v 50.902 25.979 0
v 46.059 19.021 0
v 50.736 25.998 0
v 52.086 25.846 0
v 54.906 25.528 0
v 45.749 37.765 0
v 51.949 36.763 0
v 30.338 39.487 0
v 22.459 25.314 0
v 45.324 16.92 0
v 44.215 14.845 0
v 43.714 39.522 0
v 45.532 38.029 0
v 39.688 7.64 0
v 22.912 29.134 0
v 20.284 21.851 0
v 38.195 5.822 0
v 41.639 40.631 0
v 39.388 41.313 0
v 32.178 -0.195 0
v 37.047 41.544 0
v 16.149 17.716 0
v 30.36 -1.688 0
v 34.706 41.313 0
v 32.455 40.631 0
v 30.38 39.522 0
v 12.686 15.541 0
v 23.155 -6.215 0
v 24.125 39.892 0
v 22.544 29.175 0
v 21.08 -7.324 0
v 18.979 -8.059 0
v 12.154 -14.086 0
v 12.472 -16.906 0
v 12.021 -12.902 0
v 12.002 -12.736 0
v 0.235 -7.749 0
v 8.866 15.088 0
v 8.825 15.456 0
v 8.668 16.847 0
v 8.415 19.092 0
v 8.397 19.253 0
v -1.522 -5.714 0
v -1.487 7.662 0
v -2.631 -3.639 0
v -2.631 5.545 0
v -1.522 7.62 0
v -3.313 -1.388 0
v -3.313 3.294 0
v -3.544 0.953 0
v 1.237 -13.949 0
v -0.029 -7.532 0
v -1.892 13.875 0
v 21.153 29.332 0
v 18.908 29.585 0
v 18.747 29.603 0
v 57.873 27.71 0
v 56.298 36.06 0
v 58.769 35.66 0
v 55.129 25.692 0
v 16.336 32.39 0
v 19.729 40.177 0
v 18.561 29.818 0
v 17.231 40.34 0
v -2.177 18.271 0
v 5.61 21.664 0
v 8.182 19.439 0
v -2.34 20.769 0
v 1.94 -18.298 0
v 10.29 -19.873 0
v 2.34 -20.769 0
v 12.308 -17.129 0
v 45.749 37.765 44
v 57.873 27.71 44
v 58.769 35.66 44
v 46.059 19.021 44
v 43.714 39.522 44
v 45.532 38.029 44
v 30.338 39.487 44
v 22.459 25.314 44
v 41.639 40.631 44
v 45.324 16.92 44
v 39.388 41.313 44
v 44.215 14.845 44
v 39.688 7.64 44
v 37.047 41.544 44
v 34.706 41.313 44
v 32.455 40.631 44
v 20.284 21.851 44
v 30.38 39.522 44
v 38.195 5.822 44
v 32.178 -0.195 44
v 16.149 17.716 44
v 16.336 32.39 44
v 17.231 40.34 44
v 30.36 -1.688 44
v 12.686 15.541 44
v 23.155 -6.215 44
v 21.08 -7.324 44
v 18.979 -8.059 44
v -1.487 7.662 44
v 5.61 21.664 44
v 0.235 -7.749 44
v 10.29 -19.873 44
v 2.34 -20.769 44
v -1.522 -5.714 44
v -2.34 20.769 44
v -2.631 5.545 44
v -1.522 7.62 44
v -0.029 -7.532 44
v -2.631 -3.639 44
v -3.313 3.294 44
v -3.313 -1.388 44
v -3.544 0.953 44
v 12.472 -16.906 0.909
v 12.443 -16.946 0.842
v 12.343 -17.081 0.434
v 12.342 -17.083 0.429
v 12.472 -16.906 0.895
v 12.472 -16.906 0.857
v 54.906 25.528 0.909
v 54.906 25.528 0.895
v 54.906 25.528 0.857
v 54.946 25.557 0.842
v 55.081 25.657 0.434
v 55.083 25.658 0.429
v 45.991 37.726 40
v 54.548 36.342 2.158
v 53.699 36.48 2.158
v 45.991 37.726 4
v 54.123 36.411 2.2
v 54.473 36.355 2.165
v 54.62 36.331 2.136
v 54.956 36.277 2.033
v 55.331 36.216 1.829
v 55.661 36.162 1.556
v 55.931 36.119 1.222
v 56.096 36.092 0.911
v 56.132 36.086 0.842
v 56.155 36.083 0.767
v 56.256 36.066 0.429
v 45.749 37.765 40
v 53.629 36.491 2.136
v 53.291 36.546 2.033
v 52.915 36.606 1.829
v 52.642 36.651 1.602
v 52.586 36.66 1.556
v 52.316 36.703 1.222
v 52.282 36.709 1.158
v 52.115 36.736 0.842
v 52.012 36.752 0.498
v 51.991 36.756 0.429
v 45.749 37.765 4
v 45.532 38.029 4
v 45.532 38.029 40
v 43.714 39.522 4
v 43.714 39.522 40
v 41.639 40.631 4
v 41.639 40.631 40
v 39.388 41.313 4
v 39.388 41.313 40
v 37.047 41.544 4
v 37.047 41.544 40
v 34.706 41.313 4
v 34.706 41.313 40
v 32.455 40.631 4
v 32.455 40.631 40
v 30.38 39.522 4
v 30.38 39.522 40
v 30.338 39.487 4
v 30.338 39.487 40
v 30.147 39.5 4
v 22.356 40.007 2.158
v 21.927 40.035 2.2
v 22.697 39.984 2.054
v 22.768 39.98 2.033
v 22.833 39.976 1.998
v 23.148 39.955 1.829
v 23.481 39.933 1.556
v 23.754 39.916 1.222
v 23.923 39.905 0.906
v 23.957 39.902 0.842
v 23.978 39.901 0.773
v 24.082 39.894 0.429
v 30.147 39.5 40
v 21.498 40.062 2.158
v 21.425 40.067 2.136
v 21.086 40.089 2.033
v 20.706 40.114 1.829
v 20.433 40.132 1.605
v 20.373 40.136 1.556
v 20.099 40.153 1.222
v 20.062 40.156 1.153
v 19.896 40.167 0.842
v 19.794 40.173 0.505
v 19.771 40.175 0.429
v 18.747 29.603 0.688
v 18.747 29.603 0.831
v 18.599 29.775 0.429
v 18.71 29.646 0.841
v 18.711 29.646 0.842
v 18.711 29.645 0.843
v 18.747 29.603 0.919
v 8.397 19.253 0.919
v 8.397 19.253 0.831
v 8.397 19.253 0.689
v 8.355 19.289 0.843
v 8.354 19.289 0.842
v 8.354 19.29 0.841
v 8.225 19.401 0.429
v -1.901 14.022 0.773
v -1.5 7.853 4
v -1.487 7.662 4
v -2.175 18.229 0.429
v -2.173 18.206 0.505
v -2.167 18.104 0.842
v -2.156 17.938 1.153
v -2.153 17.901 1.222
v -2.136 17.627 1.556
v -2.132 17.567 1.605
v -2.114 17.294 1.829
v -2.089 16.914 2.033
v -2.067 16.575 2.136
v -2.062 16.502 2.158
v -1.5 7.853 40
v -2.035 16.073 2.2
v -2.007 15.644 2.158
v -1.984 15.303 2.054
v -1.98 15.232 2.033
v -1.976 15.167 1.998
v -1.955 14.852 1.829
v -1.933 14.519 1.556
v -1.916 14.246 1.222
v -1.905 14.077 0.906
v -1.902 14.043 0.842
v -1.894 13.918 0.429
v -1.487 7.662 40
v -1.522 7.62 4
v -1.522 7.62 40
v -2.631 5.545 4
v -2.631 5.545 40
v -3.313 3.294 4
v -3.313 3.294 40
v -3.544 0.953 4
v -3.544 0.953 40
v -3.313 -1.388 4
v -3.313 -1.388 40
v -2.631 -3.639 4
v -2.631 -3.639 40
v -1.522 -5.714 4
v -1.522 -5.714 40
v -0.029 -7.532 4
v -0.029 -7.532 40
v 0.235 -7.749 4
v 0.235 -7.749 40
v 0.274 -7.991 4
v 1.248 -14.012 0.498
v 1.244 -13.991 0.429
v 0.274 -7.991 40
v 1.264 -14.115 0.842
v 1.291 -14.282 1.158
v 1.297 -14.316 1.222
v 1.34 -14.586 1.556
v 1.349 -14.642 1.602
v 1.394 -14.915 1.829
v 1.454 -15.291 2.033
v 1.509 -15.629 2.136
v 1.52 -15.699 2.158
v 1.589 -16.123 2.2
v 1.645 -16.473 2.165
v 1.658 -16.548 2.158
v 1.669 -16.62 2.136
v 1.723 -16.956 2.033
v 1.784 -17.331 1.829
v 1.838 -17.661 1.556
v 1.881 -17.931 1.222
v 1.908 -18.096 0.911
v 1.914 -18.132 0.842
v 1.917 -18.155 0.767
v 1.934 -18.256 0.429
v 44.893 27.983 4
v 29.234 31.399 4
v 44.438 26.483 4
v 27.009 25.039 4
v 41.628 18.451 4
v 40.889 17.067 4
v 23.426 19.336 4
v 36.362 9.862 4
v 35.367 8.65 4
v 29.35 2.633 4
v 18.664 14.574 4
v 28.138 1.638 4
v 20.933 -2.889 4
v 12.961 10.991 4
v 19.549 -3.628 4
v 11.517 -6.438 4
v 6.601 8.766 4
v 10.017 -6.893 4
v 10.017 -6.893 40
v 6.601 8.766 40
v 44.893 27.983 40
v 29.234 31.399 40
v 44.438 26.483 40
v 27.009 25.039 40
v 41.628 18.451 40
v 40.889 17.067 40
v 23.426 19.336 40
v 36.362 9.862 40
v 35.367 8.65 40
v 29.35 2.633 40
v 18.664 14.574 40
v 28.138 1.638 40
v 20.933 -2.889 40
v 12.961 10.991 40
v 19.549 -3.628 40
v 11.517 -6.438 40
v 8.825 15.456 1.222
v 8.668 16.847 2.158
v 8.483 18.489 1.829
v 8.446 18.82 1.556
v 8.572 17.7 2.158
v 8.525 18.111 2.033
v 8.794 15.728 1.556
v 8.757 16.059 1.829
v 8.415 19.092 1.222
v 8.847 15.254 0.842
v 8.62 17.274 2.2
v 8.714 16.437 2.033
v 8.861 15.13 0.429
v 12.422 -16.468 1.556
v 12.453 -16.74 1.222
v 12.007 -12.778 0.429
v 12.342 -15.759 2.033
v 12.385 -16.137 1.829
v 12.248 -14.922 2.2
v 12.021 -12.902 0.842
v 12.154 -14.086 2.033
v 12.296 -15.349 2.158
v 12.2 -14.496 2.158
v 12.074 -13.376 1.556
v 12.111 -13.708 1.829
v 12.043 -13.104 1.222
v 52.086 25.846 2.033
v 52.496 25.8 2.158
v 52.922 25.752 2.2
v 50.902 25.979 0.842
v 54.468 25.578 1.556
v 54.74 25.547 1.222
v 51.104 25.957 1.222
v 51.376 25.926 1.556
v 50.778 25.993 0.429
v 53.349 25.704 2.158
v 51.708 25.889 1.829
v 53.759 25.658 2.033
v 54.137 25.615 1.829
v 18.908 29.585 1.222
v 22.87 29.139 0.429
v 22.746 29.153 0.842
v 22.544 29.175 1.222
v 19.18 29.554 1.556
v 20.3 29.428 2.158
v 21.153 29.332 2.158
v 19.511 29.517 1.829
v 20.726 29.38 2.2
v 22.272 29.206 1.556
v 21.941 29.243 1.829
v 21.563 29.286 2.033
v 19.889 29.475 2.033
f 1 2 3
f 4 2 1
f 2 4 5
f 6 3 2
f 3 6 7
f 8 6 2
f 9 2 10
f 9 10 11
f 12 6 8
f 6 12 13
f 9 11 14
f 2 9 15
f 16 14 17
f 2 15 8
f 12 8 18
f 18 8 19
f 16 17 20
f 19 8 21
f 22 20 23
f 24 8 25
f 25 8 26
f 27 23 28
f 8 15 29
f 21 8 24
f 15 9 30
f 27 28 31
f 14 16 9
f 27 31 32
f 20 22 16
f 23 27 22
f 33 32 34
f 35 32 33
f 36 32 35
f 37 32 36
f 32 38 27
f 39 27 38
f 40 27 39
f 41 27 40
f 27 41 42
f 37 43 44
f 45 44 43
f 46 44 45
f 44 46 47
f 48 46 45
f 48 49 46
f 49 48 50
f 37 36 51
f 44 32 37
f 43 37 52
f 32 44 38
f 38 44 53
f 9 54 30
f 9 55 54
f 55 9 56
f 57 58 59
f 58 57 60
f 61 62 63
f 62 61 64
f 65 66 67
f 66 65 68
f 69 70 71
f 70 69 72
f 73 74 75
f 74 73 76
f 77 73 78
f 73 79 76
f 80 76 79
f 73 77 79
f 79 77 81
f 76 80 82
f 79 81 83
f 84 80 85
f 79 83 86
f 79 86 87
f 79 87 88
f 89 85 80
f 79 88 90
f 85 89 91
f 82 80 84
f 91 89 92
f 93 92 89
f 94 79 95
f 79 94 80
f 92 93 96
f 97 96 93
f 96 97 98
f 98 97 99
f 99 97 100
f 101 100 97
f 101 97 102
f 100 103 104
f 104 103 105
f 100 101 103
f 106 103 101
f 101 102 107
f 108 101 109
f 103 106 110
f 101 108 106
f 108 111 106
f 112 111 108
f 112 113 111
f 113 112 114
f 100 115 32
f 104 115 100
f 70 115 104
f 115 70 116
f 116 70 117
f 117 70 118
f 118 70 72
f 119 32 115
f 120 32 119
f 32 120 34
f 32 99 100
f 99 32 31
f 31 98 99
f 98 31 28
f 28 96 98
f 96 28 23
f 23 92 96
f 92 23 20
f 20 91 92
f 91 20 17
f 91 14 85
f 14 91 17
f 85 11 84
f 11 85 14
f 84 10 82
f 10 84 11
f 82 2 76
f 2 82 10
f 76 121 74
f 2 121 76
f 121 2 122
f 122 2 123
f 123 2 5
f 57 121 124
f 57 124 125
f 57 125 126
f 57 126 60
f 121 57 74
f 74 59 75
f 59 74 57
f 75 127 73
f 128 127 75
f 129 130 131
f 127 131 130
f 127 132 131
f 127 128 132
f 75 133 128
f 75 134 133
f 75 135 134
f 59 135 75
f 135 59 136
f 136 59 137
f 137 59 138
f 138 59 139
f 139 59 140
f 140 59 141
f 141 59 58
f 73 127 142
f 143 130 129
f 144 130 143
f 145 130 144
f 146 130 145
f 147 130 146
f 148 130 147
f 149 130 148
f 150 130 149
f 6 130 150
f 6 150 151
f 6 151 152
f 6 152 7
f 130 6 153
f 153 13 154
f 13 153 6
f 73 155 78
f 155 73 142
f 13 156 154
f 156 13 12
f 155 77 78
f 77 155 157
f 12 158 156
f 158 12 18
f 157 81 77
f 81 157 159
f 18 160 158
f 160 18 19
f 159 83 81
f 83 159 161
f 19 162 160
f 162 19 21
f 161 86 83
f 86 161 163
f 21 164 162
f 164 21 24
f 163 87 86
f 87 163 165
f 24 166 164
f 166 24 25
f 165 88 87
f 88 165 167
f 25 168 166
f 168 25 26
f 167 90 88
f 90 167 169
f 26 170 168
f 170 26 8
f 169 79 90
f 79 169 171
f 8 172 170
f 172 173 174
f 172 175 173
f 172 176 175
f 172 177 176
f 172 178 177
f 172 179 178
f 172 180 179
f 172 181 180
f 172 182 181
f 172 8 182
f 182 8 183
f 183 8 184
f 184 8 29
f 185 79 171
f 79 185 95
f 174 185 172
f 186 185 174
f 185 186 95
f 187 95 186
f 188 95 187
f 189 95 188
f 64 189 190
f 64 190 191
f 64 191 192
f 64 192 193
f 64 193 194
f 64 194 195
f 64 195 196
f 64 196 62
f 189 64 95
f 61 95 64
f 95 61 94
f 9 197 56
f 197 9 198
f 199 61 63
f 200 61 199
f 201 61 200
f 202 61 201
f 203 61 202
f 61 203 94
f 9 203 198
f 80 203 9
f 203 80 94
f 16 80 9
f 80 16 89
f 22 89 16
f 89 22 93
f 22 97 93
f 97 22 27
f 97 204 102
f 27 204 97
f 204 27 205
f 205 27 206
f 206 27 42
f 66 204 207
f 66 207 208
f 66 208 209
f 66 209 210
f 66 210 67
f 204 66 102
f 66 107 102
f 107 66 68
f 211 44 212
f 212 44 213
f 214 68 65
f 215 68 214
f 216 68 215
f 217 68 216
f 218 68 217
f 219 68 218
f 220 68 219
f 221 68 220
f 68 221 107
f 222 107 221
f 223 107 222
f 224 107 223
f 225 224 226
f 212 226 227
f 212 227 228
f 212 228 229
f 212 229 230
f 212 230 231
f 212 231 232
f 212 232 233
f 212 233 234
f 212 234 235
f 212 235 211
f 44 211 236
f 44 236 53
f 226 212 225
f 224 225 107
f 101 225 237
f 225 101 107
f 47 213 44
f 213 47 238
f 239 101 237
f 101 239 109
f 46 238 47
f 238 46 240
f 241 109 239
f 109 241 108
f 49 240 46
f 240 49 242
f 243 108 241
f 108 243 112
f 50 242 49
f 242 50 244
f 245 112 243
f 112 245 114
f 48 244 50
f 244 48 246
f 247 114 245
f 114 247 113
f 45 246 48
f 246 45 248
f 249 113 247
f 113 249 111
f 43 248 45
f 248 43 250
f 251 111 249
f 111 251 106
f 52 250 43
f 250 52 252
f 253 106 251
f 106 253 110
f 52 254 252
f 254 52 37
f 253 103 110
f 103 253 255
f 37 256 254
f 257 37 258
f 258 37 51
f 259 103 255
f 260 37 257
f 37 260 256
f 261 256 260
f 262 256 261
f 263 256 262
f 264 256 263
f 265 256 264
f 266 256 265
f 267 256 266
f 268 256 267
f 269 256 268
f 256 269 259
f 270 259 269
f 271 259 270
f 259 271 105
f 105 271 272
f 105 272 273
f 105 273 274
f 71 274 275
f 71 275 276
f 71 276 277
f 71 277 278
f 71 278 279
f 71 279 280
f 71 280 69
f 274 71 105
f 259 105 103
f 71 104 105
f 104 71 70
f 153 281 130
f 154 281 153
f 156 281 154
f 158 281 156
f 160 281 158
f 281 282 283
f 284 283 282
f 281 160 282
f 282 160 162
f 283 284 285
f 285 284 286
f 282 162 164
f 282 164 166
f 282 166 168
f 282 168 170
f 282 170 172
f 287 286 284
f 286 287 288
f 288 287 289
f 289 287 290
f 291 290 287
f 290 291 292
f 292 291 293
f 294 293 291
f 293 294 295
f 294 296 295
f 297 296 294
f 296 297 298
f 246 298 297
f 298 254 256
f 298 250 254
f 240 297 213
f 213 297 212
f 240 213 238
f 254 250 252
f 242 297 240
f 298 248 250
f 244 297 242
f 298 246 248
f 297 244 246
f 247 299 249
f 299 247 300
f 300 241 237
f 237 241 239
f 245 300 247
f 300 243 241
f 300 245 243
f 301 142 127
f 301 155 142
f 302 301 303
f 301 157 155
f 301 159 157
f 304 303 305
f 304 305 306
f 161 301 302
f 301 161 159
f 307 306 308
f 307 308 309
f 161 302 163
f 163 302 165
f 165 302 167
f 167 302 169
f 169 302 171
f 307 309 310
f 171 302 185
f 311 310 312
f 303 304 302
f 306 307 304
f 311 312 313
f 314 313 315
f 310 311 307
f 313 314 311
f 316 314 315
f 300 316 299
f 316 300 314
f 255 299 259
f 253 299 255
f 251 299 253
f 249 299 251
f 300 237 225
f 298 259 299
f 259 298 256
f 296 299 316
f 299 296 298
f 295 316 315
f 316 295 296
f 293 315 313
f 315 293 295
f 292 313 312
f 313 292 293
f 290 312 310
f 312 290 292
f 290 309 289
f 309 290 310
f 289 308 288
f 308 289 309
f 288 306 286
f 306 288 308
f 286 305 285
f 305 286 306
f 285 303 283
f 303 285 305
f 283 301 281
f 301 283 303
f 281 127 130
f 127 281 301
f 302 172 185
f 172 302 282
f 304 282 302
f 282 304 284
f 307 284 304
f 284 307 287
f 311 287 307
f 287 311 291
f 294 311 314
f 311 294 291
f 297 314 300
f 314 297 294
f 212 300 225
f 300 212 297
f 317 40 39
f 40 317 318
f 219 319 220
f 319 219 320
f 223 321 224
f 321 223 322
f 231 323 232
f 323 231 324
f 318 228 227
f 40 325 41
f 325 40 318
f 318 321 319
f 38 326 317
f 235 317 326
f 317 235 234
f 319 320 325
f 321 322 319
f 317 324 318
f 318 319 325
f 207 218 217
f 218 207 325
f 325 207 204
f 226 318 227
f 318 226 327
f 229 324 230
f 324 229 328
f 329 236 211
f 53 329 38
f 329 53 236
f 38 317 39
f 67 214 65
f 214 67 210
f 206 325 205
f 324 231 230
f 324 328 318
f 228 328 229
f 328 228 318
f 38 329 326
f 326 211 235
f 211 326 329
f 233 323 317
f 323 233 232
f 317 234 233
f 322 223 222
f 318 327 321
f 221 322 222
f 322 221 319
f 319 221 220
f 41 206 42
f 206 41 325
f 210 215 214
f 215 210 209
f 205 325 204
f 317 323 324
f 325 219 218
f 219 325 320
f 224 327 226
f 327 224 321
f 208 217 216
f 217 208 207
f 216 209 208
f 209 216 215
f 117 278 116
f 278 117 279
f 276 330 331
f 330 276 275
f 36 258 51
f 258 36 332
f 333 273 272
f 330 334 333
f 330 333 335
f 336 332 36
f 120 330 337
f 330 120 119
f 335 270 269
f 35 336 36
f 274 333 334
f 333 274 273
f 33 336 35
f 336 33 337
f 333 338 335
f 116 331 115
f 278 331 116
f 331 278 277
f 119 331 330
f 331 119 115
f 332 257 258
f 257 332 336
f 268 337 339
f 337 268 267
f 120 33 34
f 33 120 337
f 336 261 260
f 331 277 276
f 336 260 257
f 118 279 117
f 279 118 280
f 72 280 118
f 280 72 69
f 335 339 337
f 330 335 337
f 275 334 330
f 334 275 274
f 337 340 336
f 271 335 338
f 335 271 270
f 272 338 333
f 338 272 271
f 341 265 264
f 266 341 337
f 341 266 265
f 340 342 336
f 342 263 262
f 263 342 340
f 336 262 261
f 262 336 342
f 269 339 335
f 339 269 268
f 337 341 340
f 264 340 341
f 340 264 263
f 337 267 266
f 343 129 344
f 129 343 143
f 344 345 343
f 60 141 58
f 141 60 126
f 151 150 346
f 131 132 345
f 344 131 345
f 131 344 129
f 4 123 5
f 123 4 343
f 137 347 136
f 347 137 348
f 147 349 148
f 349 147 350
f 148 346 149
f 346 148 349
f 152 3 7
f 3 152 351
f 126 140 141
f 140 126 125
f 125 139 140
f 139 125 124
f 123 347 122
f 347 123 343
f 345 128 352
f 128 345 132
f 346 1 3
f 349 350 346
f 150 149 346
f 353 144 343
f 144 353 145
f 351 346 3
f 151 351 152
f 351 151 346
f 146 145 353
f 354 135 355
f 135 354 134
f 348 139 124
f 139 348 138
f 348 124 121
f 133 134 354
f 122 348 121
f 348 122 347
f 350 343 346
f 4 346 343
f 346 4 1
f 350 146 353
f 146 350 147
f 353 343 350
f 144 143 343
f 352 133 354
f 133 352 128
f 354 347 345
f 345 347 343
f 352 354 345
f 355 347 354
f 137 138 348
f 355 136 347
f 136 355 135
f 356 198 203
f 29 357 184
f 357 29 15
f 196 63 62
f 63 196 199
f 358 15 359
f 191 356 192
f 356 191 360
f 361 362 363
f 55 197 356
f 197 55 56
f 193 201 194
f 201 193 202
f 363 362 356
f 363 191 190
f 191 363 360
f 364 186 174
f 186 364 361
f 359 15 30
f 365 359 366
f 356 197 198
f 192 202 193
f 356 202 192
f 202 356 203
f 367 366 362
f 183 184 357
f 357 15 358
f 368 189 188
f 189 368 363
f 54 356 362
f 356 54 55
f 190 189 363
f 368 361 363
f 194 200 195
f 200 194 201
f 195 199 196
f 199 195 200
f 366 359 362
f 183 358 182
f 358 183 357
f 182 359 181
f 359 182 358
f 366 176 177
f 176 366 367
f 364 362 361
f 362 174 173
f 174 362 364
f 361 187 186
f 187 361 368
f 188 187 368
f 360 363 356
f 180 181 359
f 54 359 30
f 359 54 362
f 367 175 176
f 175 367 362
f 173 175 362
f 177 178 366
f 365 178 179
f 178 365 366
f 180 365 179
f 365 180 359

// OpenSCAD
$fn = 32;

// ----------------------------------------------------------------------
// Air duct: 24 mm duct, 4 mm wall, 44 mm across
// ----------------------------------------------------------------------

// --- parameters (mm) ---
duct_r = 12;              // duct core radius
duct_d = 24;              // duct core diameter
wall = 4;                 // duct wall thickness
height = 44;              // duct width (extrusion height)
port_r = 20.9;            // port flange half width
port_d = 41.8;            // port flange width
port_t = 8;               // port flange thickness
bolt_d = 4.4;             // port bolt holes
bolt_offset = 16.2;       // bolt hole offset from the port axis

difference() {
  /* outer hull chain: tube with a flat flange plate at every port */
  linear_extrude(height = 44) {
    hull() {
      polygon([[2.34, -20.769], [-2.34, 20.769], [5.61, 21.664], [10.29, -19.873]]);
      translate([10.931, 1.232]) circle(r = 12);
    }
    hull() {
      translate([10.931, 1.232]) circle(r = 12);
      translate([8.456, 0.953]) circle(r = 12);
    }
    hull() {
      translate([8.456, 0.953]) circle(r = 12);
      translate([16.488, 3.763]) circle(r = 12);
    }
    hull() {
      translate([16.488, 3.763]) circle(r = 12);
      translate([23.693, 8.29]) circle(r = 12);
    }
    hull() {
      translate([23.693, 8.29]) circle(r = 12);
      translate([29.71, 14.307]) circle(r = 12);
    }
    hull() {
      translate([29.71, 14.307]) circle(r = 12);
      translate([34.237, 21.512]) circle(r = 12);
    }
    hull() {
      translate([34.237, 21.512]) circle(r = 12);
      translate([37.047, 29.544]) circle(r = 12);
    }
    hull() {
      translate([37.047, 29.544]) circle(r = 12);
      translate([36.768, 27.069]) circle(r = 12);
    }
    hull() {
      translate([36.768, 27.069]) circle(r = 12);
      polygon([[17.231, 40.34], [58.769, 35.66], [57.873, 27.71], [16.336, 32.39]]);
    }
  }
  /* air passage: the same chain inset by the wall, 5 mm proud of the ports */
  translate([0, 0, 4]) linear_extrude(height = 36) {
    hull() {
      translate([-4.969, -0.56]) circle(r = 8);
      translate([8.456, 0.953]) circle(r = 8);
    }
    hull() {
      translate([8.456, 0.953]) circle(r = 8);
      translate([16.488, 3.763]) circle(r = 8);
    }
    hull() {
      translate([16.488, 3.763]) circle(r = 8);
      translate([23.693, 8.29]) circle(r = 8);
    }
    hull() {
      translate([23.693, 8.29]) circle(r = 8);
      translate([29.71, 14.307]) circle(r = 8);
    }
    hull() {
      translate([29.71, 14.307]) circle(r = 8);
      translate([34.237, 21.512]) circle(r = 8);
    }
    hull() {
      translate([34.237, 21.512]) circle(r = 8);
      translate([37.047, 29.544]) circle(r = 8);
    }
    hull() {
      translate([37.047, 29.544]) circle(r = 8);
      translate([38.56, 42.969]) circle(r = 8);
    }
  }
  translate([0, 0]) rotate([0, 0, -83.57]) translate([-16.2, -2.5]) rotate([-90, 0, 0]) cylinder(h = 13, d = 4.4);
  translate([0, 0]) rotate([0, 0, -83.57]) translate([16.2, -2.5]) rotate([-90, 0, 0]) cylinder(h = 13, d = 4.4);
  translate([38, 38]) rotate([0, 0, 173.57]) translate([-16.2, -2.5]) rotate([-90, 0, 0]) cylinder(h = 13, d = 4.4);
  translate([38, 38]) rotate([0, 0, 173.57]) translate([16.2, -2.5]) rotate([-90, 0, 0]) cylinder(h = 13, d = 4.4);
}
